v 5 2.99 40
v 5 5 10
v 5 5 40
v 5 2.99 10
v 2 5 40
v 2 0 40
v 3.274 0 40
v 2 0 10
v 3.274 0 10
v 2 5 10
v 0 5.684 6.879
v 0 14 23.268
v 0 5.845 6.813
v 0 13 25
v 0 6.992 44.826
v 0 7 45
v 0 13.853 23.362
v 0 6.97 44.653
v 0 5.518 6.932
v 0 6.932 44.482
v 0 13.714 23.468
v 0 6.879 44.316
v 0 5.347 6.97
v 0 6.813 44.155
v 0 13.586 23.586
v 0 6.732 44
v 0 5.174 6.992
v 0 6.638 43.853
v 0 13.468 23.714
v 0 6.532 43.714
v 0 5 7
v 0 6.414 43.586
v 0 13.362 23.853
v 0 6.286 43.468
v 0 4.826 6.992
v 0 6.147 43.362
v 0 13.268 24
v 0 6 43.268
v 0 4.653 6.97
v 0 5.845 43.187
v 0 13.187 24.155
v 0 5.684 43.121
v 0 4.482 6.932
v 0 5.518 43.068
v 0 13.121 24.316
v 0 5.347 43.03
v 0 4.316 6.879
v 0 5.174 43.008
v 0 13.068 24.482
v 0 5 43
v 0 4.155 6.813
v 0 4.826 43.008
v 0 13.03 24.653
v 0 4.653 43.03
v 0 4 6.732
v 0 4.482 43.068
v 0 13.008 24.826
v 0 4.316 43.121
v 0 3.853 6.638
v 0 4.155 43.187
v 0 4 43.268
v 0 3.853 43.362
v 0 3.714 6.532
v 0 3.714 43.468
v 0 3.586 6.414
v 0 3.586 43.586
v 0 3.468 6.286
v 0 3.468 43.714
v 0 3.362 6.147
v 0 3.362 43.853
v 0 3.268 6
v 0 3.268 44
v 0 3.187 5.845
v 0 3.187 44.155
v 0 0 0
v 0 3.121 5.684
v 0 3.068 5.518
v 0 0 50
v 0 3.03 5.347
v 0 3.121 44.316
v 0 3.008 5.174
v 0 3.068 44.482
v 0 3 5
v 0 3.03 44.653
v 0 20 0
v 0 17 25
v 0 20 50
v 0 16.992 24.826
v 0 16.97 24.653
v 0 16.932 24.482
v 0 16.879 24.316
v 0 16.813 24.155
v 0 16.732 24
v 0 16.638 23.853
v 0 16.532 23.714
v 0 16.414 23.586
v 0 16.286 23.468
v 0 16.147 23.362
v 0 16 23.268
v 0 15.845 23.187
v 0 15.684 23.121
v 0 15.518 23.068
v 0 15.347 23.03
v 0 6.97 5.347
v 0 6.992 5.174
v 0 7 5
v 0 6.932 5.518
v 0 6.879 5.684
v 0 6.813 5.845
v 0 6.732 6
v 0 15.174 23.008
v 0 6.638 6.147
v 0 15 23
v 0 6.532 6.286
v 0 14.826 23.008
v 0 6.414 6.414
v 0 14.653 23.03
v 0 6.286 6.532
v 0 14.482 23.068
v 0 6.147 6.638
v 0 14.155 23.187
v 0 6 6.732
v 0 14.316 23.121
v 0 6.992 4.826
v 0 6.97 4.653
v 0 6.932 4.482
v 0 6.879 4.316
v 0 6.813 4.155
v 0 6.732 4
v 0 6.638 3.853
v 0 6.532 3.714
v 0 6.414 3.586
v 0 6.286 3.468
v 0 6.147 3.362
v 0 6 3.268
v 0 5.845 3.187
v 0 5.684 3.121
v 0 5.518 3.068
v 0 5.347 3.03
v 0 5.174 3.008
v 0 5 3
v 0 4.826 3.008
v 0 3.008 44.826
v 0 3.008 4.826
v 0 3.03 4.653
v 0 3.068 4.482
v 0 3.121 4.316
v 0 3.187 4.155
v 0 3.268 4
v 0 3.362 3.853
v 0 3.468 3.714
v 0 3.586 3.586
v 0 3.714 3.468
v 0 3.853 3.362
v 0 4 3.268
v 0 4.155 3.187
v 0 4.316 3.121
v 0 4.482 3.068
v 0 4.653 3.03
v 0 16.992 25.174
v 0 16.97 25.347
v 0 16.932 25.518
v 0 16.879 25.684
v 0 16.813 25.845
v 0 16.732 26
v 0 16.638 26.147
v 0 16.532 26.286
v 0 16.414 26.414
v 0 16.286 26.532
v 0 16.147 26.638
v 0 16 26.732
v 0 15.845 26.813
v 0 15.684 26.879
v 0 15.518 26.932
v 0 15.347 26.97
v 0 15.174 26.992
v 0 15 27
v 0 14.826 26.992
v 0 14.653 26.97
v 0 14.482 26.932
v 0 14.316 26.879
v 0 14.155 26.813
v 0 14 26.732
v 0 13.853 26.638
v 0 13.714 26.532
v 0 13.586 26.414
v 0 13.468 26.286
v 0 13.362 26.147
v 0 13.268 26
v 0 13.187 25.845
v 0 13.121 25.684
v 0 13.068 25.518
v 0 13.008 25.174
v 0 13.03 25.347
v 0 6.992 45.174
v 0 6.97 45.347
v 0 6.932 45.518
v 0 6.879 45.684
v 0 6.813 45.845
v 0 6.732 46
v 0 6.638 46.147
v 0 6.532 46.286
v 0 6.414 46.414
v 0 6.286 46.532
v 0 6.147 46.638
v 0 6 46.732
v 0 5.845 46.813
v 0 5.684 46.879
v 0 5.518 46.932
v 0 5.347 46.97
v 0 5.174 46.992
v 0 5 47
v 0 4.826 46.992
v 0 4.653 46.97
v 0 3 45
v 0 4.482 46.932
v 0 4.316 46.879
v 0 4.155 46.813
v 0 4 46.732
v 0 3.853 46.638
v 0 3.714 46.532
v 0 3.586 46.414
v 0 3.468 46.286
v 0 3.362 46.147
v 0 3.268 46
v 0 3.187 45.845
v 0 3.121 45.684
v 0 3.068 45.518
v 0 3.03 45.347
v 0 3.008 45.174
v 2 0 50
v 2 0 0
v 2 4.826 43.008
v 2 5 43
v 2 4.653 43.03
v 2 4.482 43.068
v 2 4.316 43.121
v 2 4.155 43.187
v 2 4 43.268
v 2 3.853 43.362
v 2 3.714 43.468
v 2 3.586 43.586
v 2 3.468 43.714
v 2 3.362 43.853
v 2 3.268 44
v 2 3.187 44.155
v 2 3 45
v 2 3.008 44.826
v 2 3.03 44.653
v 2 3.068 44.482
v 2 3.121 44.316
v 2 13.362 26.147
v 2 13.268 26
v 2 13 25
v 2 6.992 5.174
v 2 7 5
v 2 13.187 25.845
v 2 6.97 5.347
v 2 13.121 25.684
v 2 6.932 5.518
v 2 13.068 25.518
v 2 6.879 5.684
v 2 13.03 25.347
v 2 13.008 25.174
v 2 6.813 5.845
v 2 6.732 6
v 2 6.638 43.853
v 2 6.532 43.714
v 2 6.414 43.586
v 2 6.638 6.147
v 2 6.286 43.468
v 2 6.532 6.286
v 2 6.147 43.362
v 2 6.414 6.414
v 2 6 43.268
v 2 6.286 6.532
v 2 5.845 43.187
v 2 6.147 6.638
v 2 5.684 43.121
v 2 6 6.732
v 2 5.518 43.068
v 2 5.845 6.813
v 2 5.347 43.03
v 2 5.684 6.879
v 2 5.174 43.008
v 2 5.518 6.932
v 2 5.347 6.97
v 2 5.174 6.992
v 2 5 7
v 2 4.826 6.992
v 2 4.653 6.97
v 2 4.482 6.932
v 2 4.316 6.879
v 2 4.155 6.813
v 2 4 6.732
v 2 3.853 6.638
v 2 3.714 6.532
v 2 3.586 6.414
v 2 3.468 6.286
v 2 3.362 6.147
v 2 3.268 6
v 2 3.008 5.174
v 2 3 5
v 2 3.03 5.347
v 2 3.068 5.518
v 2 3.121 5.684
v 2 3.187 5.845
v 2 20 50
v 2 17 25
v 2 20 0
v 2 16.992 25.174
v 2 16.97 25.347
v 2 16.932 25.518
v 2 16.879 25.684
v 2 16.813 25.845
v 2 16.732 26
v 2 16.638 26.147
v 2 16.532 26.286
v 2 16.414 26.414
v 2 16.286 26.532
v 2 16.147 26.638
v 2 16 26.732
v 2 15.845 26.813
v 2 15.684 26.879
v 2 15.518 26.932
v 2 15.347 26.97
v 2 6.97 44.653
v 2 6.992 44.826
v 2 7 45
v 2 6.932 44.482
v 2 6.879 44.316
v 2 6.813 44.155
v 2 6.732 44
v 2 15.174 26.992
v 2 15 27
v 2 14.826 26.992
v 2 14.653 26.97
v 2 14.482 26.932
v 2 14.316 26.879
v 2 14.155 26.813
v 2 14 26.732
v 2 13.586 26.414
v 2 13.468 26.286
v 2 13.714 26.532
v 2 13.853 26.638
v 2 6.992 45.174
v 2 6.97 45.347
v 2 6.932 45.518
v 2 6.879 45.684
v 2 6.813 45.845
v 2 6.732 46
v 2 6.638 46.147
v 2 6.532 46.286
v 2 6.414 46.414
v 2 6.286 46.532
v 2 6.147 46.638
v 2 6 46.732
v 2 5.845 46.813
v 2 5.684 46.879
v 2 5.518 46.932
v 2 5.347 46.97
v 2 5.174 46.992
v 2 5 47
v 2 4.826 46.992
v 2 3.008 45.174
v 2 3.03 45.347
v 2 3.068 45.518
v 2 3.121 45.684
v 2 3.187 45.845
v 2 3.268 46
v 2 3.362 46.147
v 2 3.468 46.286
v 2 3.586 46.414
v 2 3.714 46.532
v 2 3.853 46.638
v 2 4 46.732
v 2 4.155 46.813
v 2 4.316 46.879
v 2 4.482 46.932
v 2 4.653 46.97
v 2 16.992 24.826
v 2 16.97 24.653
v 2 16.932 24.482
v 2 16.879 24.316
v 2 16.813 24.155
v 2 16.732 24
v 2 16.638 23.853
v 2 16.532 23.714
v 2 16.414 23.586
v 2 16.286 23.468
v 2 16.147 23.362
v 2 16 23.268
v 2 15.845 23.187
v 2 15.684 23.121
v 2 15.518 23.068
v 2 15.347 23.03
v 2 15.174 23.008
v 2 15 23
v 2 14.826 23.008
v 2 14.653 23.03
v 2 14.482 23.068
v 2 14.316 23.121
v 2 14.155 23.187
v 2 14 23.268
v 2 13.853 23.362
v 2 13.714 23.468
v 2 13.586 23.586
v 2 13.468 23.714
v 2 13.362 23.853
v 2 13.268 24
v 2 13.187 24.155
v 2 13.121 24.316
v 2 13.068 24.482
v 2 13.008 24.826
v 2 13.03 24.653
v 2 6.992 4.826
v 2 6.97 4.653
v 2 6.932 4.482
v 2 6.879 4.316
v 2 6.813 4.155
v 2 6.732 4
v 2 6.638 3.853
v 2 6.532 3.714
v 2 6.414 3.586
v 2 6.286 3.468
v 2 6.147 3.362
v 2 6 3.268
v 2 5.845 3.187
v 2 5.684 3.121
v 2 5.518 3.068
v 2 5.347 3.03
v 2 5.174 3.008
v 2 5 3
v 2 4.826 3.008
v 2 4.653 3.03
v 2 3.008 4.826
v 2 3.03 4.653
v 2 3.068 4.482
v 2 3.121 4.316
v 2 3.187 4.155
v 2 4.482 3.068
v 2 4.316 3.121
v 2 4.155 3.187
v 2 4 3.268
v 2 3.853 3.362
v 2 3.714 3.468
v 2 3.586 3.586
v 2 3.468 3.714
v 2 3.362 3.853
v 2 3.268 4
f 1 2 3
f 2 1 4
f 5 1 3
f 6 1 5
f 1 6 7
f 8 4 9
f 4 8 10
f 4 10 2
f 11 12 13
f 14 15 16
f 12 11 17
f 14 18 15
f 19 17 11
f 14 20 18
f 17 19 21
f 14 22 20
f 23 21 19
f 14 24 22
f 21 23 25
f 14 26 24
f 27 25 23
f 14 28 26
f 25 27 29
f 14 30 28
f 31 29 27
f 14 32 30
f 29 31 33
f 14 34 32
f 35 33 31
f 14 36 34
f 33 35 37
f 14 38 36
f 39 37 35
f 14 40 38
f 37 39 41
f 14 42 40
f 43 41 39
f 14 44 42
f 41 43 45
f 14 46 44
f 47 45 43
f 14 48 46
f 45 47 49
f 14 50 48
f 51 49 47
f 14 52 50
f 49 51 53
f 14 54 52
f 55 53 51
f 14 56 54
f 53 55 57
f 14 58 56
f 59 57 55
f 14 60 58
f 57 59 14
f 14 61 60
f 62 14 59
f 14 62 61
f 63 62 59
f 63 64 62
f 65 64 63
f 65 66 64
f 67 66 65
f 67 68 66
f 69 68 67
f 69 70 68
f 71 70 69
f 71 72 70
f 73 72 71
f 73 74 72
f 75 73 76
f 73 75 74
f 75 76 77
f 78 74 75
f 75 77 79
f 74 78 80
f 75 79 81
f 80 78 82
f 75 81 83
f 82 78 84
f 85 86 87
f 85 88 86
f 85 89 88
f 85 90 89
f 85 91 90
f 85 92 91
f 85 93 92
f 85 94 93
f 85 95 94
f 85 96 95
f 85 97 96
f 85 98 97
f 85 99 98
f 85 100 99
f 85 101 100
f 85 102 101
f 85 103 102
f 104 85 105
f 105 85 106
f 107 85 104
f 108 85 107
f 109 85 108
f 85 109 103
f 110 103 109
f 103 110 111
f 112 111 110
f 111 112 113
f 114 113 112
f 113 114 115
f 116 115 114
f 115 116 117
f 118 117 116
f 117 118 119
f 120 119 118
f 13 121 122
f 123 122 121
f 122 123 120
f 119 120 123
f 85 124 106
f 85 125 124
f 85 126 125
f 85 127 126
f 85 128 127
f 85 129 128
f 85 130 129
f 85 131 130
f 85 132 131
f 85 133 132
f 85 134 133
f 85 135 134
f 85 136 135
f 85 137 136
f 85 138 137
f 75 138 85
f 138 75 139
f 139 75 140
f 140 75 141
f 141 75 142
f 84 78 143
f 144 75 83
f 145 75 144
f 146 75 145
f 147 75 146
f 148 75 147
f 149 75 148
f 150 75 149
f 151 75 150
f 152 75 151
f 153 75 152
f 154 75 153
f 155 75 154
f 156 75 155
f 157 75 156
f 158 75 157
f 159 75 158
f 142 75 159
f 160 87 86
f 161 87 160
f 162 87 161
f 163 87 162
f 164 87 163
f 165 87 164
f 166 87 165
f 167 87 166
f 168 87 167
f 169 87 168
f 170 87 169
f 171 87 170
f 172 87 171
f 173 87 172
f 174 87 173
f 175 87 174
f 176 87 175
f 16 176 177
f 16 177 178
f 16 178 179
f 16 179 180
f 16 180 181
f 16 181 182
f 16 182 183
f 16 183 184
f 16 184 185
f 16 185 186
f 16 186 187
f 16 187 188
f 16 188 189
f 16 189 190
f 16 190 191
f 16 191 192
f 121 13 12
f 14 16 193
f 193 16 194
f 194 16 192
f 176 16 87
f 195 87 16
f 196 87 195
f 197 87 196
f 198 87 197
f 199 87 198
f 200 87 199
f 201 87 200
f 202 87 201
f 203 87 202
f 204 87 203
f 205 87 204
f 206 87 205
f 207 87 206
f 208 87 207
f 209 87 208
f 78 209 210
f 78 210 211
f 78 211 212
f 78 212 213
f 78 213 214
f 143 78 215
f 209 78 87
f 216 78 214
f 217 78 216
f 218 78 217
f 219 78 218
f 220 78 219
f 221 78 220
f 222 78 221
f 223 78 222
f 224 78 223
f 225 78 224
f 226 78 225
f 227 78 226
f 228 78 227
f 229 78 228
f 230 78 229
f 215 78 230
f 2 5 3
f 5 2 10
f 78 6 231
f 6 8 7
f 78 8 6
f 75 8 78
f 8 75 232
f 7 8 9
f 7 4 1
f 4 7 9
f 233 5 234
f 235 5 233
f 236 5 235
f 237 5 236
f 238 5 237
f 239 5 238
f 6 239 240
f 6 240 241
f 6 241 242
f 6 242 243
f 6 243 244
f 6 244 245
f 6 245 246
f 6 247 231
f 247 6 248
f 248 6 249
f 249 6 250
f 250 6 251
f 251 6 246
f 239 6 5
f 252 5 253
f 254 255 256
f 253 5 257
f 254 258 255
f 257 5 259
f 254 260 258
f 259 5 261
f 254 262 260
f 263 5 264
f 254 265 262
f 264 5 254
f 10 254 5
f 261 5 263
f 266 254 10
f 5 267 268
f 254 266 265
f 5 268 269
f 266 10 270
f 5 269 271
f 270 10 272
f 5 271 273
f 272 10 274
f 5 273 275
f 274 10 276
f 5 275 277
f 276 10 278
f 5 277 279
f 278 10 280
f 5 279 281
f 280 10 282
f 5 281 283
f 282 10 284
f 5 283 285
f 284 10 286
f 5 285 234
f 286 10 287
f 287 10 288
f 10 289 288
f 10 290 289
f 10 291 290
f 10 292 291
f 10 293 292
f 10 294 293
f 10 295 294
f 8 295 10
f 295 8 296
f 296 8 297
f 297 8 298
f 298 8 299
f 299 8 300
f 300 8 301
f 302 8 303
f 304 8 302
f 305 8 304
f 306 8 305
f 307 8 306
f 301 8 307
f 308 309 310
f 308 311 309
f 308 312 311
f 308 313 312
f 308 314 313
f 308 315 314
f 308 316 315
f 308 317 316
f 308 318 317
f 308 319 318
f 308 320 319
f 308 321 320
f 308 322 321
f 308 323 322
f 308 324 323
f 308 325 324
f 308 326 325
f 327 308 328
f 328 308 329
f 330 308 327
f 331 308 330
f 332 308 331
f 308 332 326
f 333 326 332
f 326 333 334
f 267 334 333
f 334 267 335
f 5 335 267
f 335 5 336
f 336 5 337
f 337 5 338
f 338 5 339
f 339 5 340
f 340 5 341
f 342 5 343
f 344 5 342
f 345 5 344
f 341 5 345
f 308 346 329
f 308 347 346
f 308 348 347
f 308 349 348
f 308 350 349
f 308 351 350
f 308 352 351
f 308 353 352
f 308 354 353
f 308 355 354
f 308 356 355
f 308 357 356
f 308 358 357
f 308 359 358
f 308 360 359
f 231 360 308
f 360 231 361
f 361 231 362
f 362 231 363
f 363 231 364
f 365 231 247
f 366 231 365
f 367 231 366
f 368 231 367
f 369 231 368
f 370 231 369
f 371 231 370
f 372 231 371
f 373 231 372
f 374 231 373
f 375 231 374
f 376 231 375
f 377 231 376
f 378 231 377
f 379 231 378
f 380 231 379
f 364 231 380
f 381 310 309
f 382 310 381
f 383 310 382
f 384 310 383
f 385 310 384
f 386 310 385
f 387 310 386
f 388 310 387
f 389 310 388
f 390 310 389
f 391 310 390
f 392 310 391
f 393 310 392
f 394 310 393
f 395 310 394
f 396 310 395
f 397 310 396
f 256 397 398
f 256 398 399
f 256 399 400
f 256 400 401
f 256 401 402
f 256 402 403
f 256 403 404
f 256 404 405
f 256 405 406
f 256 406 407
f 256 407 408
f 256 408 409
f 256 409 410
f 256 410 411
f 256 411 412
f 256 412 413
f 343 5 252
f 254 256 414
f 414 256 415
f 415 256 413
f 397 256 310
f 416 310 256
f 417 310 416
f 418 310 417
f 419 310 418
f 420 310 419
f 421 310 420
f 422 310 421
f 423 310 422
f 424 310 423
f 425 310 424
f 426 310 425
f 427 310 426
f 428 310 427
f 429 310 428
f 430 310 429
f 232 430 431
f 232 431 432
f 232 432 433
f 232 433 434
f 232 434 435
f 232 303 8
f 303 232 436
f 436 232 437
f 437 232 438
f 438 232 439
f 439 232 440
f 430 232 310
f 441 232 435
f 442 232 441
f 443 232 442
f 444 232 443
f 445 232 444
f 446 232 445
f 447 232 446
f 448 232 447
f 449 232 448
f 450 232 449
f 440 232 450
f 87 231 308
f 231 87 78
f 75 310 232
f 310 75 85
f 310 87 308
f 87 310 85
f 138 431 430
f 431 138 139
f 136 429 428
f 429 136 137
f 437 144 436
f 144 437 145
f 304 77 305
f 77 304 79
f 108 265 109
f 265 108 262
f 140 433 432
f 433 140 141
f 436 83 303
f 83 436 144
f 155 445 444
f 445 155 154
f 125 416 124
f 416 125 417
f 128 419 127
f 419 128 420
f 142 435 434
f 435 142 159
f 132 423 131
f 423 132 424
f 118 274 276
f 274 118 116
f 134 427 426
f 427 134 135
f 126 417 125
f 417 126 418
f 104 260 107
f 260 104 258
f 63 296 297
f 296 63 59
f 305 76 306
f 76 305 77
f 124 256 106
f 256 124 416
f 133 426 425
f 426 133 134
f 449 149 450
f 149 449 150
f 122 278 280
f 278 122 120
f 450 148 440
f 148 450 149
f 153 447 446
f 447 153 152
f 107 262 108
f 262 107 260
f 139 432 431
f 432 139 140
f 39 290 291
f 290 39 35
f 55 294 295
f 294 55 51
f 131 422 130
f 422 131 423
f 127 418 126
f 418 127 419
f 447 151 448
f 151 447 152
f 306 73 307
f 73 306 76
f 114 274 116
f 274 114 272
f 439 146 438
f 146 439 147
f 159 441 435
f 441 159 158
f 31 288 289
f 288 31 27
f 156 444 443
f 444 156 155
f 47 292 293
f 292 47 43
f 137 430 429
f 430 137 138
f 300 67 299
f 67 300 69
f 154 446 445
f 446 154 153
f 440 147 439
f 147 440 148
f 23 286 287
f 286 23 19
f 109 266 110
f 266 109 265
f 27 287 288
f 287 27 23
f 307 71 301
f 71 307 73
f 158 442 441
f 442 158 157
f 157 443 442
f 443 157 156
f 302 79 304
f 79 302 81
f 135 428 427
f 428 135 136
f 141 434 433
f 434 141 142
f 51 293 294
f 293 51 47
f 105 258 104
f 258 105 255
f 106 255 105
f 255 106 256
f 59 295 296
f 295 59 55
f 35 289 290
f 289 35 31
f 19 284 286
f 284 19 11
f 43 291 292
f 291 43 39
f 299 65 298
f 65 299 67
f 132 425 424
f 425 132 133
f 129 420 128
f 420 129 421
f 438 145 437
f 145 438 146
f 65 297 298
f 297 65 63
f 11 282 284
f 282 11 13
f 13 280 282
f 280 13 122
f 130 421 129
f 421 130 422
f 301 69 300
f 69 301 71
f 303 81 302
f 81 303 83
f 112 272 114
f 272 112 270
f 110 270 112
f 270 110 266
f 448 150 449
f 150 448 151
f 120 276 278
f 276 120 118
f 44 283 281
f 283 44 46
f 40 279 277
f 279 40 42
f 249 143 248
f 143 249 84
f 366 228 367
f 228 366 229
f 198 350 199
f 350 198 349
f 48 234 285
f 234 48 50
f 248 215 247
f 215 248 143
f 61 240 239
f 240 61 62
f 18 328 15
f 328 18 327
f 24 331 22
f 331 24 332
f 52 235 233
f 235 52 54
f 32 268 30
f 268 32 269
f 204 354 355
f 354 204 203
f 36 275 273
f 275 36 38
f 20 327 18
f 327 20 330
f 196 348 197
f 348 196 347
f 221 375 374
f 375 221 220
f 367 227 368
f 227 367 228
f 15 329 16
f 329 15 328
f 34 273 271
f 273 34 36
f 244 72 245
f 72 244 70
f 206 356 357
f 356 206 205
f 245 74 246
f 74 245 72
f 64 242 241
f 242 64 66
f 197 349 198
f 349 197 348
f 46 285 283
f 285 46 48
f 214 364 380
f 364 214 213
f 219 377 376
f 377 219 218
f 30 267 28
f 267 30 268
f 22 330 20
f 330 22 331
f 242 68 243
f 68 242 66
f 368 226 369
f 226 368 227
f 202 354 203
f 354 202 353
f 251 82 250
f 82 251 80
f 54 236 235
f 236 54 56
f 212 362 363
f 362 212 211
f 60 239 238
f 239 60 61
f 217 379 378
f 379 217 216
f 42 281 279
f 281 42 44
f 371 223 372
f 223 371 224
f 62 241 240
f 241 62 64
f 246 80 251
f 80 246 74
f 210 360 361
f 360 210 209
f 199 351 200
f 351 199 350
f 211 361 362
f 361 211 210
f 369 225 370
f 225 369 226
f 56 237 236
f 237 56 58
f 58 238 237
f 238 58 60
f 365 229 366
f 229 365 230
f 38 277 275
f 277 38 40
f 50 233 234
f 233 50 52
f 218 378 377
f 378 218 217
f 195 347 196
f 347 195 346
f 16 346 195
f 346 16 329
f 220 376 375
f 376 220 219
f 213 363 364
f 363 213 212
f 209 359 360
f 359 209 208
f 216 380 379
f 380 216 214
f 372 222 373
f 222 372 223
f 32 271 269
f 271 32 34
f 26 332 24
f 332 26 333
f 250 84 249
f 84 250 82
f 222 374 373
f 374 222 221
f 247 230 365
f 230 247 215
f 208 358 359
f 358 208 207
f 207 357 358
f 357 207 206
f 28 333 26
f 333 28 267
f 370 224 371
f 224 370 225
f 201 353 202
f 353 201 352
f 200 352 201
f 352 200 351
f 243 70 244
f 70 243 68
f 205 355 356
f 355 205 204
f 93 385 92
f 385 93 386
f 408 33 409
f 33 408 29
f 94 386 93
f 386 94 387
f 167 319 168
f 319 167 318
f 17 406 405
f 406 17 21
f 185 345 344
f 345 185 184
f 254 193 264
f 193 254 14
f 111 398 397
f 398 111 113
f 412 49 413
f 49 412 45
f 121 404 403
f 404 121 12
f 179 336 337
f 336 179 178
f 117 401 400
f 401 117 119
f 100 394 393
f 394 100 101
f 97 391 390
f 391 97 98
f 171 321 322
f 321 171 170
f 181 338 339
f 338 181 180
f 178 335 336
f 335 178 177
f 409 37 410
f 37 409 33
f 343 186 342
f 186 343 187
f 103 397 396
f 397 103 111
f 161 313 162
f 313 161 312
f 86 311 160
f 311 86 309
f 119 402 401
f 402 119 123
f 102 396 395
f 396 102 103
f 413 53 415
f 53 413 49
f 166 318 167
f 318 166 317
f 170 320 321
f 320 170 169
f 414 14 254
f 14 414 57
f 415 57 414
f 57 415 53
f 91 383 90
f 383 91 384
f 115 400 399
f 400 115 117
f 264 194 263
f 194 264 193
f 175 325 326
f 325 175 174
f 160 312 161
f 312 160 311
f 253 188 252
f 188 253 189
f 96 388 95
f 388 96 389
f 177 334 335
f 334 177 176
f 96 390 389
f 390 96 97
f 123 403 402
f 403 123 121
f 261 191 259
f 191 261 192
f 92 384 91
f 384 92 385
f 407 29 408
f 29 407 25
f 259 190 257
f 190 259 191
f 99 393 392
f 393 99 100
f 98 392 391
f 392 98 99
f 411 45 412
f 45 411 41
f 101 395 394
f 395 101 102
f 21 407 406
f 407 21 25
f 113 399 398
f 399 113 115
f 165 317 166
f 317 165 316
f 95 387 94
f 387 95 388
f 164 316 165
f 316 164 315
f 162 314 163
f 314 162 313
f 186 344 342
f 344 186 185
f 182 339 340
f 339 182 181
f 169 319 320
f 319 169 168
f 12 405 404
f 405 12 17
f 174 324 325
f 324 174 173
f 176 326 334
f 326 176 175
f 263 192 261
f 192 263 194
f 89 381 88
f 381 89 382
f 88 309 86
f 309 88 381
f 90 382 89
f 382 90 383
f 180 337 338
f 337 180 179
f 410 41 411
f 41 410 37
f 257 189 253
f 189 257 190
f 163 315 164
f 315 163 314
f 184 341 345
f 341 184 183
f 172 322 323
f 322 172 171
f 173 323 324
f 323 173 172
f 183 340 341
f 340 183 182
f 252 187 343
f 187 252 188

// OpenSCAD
// Global resolution
$fs = 0.1;  // Don't generate smaller facets than 0.1 mm
$fa = 5;    // Don't generate larger angles than 5 degrees

length = 180;
width = 34;
wall_thickness = 2;

difference() {
union() {
difference() {
translate([0,0,10])
cube([5,5,30]);
    
translate([-2.5,0,0])
    rotate([0,0,-30])
    translate([5,0,0])
    cube([10,10,50]);
};

cube([2,20,50]);
};

translate([0,5,5])
rotate([0,90,0])
cylinder(10, 2, 2, center=true);

translate([0,5,45])
rotate([0,90,0])
cylinder(10, 2, 2, center=true);

translate([0,15,25])
rotate([0,90,0])
cylinder(10, 2, 2, center=true);
};
